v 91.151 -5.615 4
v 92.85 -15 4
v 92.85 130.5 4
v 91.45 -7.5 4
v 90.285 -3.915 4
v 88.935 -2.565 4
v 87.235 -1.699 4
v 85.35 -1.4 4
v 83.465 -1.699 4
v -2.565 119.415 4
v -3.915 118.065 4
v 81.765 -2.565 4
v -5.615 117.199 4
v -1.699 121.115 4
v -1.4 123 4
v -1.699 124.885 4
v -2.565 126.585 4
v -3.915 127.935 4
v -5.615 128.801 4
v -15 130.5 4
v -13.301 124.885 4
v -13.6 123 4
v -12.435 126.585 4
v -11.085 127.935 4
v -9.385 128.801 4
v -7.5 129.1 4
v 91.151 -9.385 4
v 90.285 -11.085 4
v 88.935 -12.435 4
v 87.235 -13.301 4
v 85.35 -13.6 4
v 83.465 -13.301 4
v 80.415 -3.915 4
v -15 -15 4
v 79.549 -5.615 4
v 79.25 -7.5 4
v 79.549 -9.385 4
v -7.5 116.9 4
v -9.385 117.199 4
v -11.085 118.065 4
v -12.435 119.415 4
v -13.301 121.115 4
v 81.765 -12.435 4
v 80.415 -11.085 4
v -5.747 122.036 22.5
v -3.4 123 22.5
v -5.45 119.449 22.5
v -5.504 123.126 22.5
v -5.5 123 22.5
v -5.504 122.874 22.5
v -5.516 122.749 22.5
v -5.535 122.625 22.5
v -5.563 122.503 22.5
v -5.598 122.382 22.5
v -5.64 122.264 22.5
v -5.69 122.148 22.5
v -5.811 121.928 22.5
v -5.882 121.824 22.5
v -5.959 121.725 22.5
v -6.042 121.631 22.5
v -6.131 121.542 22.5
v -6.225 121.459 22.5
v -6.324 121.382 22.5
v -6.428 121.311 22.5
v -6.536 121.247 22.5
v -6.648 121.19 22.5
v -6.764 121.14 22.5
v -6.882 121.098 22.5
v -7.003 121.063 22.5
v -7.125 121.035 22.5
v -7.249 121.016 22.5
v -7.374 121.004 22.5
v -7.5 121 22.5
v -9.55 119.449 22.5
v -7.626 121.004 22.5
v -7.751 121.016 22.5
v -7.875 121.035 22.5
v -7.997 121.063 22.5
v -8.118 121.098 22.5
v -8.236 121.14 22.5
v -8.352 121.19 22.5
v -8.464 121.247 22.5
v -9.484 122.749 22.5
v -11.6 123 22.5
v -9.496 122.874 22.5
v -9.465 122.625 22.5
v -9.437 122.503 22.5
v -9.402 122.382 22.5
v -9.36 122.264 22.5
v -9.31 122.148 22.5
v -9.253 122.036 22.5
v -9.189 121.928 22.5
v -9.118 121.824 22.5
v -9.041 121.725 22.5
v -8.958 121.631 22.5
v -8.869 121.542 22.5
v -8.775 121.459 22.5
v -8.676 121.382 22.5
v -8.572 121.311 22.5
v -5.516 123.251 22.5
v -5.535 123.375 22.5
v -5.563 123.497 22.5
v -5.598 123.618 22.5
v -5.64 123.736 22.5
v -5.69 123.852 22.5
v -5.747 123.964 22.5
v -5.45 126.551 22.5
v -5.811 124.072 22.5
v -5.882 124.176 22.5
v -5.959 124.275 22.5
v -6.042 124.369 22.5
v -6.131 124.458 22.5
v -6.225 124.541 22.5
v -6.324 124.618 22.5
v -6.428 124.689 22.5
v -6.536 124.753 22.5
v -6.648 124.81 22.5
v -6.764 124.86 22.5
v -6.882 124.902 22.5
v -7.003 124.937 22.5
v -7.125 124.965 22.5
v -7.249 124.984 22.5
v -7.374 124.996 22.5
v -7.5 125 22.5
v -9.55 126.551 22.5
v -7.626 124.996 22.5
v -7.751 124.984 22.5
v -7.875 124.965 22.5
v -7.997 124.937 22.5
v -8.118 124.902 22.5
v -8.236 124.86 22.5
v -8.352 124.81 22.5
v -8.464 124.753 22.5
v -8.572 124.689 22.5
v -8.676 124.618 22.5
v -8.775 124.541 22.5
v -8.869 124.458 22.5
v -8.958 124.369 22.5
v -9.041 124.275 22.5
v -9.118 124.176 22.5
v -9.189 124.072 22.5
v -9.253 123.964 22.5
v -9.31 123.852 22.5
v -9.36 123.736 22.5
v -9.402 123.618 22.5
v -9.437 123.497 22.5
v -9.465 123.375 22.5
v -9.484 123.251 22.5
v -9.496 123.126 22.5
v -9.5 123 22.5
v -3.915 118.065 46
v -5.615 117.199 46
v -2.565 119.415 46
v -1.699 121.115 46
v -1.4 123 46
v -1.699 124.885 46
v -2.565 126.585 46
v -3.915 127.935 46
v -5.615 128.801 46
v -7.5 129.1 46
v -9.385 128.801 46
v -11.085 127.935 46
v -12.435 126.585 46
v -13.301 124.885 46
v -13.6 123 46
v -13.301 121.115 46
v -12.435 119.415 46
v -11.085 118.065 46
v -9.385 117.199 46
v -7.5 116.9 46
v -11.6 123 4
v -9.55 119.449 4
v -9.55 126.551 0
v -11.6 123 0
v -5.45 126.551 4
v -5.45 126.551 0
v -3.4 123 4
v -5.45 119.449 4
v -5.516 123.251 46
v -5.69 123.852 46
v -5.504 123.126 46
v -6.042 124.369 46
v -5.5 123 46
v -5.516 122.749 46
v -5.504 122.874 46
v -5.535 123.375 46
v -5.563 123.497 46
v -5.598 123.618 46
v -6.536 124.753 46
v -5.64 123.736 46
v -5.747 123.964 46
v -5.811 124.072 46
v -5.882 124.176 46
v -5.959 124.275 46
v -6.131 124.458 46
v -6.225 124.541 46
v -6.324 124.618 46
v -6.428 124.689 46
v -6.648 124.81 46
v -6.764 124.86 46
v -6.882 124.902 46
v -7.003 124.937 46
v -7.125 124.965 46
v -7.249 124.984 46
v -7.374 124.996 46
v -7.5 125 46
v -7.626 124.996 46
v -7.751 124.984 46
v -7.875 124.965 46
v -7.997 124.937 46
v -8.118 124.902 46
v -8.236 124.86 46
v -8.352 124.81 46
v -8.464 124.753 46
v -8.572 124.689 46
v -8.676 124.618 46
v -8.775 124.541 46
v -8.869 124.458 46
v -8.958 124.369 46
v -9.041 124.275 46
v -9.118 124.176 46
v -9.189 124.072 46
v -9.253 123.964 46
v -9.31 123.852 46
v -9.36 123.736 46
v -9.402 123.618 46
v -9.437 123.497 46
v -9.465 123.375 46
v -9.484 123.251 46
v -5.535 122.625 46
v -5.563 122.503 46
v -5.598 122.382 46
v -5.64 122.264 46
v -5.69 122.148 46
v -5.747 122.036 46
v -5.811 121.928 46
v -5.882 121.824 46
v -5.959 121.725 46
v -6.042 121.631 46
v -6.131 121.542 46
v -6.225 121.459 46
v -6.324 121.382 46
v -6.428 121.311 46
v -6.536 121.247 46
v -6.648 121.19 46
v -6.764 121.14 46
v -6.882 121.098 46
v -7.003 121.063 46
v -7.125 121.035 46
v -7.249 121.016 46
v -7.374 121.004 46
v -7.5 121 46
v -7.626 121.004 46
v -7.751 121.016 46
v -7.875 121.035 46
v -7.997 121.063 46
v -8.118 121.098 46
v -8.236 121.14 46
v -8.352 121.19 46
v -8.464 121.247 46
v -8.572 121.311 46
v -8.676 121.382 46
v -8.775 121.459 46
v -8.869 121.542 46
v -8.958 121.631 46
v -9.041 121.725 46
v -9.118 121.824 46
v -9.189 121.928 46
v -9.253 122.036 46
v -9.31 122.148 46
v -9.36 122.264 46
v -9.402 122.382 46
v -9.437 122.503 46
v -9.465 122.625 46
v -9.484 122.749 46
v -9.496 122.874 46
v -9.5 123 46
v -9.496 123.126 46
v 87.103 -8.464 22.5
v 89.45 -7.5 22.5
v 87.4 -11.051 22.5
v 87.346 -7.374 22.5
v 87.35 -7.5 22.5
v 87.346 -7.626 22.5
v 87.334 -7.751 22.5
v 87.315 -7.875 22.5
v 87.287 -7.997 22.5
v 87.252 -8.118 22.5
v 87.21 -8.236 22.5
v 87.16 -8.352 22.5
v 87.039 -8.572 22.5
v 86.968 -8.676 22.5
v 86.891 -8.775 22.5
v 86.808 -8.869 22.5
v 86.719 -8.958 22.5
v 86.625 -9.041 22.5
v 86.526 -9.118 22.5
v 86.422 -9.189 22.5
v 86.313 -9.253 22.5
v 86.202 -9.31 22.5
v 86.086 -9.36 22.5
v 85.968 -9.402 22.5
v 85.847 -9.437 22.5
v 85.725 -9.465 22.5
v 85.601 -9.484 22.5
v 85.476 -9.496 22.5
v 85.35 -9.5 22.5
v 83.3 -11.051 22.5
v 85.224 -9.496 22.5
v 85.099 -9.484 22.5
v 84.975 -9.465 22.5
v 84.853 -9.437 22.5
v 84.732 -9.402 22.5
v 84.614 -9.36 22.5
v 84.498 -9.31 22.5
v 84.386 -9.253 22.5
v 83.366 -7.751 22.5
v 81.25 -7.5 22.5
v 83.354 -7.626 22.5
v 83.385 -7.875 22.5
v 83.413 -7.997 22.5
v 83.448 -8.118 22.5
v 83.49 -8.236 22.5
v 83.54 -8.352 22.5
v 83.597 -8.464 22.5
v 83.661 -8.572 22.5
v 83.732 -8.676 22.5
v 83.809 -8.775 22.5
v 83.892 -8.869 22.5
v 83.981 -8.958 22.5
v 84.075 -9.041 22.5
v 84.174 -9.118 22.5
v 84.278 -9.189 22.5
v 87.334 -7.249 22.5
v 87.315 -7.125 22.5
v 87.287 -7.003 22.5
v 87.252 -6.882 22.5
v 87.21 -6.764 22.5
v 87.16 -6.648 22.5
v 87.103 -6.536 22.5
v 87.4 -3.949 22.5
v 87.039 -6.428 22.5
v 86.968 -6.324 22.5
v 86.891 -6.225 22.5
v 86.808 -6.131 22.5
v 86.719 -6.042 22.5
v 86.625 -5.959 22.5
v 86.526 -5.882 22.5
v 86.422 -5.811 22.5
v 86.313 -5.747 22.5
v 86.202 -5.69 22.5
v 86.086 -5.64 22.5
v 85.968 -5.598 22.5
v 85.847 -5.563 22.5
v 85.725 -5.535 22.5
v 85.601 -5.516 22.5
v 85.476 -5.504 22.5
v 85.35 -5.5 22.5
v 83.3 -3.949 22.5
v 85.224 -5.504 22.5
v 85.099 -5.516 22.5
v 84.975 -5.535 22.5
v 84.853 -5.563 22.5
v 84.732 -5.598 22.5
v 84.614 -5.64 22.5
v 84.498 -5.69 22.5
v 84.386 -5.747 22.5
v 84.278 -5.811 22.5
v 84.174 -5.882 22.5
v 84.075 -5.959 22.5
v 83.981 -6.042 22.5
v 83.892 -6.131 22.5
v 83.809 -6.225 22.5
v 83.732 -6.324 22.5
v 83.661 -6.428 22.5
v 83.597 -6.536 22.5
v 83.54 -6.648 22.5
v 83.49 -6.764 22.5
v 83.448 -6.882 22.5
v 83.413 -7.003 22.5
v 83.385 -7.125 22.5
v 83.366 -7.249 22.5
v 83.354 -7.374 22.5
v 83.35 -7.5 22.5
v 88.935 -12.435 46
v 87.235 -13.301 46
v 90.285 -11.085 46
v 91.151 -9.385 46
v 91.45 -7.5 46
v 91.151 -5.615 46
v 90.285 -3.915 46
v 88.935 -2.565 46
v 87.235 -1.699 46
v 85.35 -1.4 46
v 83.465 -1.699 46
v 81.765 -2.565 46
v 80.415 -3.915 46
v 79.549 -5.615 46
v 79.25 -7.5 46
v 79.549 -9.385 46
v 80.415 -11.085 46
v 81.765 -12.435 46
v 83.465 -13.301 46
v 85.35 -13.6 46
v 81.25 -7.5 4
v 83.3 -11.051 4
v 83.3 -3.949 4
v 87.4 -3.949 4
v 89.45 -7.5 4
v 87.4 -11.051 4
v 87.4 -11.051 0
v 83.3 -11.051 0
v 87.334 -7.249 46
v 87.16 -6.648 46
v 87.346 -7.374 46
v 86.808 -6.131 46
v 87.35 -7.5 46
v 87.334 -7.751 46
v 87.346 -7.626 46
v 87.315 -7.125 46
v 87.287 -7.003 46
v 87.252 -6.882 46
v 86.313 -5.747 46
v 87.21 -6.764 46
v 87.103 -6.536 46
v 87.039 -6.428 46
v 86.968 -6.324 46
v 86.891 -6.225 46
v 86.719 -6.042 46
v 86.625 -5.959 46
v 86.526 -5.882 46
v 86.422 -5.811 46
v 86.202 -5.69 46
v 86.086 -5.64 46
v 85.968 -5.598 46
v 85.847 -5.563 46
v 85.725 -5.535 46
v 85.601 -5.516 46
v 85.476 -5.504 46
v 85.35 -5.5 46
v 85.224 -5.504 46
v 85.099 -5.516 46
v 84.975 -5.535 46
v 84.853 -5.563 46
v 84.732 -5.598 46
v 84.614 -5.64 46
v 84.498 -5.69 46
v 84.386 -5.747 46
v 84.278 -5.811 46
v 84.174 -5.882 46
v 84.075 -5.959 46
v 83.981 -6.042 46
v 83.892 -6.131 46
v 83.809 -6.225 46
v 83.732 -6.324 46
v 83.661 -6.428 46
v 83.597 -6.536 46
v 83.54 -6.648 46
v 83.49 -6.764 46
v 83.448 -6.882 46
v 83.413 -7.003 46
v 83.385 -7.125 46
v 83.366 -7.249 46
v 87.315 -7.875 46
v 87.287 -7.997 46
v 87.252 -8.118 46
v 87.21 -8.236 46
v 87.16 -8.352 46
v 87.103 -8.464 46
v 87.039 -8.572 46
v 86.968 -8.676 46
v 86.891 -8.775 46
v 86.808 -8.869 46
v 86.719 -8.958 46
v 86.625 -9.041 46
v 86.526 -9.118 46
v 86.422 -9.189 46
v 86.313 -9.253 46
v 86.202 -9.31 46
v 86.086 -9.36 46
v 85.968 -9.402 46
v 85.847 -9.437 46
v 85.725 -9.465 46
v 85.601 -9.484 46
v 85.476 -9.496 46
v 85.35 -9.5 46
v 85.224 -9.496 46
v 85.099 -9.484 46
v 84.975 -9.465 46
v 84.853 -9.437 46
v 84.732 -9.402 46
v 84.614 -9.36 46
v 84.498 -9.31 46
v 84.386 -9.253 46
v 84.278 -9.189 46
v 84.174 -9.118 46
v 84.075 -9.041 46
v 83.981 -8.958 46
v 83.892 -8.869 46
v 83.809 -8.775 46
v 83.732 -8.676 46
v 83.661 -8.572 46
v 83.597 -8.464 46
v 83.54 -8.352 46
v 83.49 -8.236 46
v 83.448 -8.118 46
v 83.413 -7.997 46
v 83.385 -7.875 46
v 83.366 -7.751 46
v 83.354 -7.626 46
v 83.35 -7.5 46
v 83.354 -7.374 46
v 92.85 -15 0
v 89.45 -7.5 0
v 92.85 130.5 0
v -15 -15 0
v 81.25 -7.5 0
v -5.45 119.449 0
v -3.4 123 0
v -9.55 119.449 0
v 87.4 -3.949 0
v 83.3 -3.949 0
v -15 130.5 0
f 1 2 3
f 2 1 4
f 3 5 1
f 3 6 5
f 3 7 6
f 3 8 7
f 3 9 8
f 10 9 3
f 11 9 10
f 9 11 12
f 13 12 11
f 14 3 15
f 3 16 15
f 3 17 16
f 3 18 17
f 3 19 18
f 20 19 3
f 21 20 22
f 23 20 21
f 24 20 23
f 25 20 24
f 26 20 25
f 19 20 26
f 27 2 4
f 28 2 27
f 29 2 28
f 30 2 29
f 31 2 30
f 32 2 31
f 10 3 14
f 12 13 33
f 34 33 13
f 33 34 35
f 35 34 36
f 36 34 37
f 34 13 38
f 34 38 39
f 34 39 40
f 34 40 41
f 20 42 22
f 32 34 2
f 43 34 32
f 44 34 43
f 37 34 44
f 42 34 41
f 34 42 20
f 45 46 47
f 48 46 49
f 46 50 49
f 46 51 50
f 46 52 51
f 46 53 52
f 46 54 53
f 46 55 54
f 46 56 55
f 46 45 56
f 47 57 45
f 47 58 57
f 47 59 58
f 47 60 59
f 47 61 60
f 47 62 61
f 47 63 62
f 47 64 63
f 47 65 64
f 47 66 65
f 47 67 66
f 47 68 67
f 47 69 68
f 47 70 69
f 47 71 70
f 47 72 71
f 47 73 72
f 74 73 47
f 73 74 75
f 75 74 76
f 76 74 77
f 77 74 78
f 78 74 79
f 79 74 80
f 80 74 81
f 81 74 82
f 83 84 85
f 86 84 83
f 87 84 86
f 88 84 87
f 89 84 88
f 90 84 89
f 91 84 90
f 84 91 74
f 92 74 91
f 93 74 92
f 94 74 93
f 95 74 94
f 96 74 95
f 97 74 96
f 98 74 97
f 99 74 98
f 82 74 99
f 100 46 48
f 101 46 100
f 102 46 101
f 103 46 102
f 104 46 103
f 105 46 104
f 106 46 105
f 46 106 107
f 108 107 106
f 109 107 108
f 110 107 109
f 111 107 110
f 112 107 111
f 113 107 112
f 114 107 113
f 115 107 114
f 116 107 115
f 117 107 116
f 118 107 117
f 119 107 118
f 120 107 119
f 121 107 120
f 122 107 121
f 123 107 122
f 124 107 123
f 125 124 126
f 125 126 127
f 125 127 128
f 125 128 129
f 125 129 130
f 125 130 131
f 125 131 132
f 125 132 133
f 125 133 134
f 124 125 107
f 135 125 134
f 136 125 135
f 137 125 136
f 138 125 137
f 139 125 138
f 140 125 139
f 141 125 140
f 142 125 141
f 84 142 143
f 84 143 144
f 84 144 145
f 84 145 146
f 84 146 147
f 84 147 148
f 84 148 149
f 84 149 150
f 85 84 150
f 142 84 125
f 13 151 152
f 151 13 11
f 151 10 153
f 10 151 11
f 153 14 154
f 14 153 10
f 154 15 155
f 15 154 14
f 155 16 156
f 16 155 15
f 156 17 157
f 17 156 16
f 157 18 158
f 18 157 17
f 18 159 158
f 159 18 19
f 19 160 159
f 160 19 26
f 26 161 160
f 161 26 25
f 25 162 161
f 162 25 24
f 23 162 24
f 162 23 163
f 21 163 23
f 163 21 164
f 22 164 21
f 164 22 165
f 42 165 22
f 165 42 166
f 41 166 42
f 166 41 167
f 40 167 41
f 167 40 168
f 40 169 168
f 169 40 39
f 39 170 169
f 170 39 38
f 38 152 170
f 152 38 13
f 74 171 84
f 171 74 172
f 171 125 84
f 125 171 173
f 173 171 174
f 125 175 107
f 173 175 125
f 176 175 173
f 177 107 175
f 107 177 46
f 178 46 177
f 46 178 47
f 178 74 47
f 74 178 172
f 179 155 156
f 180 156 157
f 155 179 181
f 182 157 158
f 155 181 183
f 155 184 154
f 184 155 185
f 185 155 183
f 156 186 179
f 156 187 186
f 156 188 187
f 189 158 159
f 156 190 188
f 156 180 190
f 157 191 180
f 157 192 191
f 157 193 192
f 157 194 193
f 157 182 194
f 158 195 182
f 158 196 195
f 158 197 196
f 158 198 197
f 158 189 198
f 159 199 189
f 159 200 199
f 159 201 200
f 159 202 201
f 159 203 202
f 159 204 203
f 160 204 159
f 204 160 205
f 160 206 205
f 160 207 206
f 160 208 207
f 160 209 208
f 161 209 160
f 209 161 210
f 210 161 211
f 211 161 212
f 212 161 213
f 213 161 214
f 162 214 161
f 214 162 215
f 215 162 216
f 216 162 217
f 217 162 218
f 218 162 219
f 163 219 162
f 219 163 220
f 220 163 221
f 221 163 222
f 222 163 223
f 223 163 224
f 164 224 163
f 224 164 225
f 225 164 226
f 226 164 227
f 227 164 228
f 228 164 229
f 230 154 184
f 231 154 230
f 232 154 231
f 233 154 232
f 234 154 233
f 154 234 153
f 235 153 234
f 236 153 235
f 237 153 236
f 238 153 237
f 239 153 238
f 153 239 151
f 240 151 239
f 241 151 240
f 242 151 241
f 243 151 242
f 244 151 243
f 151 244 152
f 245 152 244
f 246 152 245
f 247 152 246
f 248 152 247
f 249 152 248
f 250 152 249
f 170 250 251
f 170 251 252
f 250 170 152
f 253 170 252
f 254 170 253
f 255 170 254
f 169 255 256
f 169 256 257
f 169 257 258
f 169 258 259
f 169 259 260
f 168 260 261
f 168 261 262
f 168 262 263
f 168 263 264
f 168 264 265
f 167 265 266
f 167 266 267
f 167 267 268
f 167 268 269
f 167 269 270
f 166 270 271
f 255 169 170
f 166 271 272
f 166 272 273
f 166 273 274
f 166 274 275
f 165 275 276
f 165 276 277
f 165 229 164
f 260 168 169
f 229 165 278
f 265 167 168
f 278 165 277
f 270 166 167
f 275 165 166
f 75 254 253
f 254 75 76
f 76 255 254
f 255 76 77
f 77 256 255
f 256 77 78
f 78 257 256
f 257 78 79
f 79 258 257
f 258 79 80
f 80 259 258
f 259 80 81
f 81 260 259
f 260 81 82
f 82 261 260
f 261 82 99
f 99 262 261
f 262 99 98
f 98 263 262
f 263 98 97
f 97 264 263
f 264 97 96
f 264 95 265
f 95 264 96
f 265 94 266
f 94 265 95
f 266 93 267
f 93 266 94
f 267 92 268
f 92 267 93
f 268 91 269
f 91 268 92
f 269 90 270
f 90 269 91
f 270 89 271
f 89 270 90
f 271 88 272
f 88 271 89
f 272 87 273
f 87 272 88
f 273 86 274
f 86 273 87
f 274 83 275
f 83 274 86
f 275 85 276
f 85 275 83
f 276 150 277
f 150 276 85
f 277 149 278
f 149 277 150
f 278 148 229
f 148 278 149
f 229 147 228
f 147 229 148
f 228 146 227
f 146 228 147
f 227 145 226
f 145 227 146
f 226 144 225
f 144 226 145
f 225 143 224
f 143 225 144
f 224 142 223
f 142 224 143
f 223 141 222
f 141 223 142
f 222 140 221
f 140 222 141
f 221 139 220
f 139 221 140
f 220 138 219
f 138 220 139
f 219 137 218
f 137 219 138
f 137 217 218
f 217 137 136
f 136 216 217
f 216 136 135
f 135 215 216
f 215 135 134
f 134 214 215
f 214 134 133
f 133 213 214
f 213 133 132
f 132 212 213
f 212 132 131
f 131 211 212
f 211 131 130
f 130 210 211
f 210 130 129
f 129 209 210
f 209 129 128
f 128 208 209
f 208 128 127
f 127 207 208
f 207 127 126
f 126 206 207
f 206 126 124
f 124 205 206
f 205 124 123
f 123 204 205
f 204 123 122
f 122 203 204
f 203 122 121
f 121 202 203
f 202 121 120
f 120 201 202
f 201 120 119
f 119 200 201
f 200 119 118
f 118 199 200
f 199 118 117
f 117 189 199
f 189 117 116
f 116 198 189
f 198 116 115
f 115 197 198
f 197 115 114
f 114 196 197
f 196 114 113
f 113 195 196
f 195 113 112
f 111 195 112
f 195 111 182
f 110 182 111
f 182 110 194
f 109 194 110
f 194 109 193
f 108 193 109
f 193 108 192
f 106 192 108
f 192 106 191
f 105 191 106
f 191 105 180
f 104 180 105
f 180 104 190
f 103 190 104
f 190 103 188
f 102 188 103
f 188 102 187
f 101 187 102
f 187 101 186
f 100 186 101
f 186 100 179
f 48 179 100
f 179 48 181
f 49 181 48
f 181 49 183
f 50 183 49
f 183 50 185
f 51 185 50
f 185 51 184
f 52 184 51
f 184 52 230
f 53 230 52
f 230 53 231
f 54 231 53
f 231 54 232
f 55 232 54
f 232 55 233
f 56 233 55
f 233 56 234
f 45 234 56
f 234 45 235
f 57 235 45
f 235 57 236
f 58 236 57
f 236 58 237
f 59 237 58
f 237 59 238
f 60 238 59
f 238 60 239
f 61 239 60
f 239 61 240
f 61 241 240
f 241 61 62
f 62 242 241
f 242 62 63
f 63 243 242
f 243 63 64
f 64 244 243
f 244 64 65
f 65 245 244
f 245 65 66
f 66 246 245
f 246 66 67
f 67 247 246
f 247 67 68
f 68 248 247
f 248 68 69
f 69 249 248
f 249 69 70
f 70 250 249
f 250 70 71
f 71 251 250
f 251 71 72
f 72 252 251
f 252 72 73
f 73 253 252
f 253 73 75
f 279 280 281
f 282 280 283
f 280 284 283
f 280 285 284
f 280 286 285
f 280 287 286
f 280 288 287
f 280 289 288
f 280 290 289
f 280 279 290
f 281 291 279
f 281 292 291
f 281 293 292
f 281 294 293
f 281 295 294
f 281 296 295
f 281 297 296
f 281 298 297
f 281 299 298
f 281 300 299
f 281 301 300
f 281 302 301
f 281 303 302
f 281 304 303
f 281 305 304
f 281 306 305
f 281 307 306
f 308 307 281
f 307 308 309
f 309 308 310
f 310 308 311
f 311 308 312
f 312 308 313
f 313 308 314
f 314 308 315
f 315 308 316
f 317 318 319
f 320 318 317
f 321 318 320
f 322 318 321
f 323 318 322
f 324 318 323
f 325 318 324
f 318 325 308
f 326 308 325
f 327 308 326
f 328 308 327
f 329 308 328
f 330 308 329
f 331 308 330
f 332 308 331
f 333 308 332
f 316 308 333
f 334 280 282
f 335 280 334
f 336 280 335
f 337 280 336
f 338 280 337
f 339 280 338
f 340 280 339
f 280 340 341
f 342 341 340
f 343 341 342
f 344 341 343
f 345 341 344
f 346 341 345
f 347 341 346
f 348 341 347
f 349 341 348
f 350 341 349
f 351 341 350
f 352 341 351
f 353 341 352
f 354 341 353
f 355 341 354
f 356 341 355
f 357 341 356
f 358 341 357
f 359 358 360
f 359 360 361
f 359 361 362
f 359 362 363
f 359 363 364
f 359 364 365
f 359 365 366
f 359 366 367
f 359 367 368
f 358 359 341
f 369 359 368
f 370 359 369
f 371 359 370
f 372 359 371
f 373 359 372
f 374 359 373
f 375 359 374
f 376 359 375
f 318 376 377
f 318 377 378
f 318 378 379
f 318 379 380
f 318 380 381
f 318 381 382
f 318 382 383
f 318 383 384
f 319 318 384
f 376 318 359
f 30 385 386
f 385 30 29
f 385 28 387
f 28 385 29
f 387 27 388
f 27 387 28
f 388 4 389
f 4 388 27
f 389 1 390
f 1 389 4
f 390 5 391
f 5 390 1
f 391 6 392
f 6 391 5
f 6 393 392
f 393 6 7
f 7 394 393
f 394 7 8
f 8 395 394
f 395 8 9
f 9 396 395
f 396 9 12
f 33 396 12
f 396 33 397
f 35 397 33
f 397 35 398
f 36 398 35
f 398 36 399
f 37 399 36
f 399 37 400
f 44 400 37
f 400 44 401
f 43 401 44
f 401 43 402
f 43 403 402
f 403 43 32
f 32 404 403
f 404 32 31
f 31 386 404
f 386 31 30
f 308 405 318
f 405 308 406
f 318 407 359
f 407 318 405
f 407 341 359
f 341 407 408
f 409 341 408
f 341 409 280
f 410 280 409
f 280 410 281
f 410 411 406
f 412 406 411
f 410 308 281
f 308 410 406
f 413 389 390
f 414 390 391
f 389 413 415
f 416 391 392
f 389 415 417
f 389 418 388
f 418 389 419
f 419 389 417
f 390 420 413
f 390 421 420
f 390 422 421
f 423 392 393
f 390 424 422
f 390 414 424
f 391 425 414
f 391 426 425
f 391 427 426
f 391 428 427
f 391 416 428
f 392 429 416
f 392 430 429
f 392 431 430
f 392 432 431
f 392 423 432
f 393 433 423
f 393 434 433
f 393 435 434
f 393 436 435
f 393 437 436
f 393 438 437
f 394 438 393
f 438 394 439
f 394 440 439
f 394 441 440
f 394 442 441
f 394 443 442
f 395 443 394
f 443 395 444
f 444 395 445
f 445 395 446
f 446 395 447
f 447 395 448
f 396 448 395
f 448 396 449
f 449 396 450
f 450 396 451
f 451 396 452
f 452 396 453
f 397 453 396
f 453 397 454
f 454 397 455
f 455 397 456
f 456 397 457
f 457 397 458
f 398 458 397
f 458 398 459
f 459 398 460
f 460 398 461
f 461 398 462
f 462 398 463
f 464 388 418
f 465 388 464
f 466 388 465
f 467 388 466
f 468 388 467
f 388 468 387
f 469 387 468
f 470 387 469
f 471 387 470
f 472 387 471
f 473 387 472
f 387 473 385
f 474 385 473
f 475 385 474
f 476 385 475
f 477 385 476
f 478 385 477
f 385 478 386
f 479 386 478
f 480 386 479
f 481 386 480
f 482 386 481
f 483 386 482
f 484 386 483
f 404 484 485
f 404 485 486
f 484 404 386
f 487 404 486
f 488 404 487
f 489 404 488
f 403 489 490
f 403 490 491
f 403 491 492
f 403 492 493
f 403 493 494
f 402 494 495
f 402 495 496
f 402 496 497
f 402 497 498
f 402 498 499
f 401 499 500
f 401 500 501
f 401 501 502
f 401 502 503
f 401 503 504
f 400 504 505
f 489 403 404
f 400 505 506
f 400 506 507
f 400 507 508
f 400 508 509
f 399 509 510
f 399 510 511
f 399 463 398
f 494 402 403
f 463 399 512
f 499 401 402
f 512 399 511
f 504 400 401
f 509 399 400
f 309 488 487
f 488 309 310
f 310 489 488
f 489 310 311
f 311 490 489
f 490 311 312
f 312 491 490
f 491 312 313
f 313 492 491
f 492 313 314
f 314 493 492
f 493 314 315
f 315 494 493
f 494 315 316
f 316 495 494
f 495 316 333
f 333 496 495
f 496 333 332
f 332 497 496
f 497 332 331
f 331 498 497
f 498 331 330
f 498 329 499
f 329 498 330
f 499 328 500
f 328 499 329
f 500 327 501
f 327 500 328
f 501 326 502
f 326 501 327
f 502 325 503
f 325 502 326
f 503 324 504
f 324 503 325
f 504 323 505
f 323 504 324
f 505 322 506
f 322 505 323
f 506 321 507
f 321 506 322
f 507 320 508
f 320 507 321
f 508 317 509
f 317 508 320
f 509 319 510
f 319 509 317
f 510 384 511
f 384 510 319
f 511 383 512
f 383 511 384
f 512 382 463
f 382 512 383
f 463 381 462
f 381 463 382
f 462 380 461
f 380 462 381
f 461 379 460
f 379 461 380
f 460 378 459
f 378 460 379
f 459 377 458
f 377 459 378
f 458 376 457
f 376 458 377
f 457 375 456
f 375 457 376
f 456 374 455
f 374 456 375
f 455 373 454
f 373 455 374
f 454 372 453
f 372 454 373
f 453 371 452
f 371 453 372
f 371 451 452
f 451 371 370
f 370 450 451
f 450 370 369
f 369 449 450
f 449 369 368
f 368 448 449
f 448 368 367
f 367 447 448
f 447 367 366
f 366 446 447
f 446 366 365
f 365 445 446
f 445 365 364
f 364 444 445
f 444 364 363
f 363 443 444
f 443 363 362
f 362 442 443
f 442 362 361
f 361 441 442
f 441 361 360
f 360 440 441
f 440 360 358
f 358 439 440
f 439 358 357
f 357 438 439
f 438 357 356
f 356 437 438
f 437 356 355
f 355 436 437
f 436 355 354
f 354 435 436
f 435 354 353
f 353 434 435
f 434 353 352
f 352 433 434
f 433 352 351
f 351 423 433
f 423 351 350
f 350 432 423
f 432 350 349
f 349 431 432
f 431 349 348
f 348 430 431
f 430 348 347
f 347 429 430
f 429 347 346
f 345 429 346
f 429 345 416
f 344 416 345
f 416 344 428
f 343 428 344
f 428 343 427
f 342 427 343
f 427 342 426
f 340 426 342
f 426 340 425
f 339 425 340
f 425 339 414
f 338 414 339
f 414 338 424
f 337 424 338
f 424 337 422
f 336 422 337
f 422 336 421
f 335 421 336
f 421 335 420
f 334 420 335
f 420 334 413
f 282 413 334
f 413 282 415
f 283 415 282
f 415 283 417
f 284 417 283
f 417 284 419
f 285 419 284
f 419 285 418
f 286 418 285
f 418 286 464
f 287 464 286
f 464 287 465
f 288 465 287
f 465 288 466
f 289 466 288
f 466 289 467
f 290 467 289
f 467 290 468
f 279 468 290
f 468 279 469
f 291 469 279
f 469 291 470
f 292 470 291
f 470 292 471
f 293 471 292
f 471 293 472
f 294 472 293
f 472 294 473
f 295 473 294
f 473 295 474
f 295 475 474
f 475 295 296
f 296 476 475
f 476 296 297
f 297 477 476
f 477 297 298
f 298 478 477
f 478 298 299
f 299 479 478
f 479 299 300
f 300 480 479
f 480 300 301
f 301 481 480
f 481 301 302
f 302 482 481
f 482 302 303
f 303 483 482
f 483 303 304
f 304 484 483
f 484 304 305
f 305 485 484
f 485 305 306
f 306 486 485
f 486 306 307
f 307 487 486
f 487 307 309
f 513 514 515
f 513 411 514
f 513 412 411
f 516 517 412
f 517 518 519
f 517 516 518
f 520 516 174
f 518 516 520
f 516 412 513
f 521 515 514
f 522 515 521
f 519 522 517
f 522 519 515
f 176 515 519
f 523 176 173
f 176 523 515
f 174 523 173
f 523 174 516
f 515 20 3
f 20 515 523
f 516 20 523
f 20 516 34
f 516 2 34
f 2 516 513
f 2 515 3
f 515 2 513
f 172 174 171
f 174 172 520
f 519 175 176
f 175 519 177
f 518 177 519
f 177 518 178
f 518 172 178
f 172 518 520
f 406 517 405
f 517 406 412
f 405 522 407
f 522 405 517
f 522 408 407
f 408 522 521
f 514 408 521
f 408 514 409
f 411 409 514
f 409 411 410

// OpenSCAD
PSU_WIDTH = 77.85;
PSU_DEPTH = 115.5;
PSU_HEIGHT = 37;
LAYER_HEIGHT = 4;
OFFSET = 15;

module main(){
  base();
  translate([-OFFSET/2, PSU_DEPTH + OFFSET/2, LAYER_HEIGHT])
    high_low_connector();

  translate([PSU_WIDTH + OFFSET/2, -OFFSET/2, LAYER_HEIGHT])
    high_low_connector();  
}

module base(){
  // First layer
  linear_extrude(LAYER_HEIGHT)  
  difference(){
    translate([-OFFSET, -OFFSET])
    square([PSU_WIDTH + OFFSET*2, PSU_DEPTH + OFFSET*2]);

    translate([-OFFSET/2, PSU_DEPTH + OFFSET/2, 0])    
    m4_6_nut_2d();        

    translate([PSU_WIDTH + OFFSET/2, -OFFSET/2, 0])
    m4_6_nut_2d();              
  }  
}

module high_low_connector(){
  // First layer  
  linear_extrude(PSU_HEIGHT/2){
      difference(){
	circle(r=4.1+2);
	m4_6_nut_2d();
      }
    }

    // Second layer
  translate([0,0, PSU_HEIGHT/2]) {
    linear_extrude(PSU_HEIGHT/2 + 5){
      difference(){
	circle(r=4.1+2);
	m4_6_screw_2d();
      }      
    }
  }
}

module m4_6_screw_2d(){
  $fn = 100;
  circle(2);
}


module m4_6_screw_3d(length){
  linear_extrude(length)
    m4_6_screw_2d();
}

module m4_6_nut_2d(){
  $fn = 6;
  circle(4.1);
}
module m4_6_nut_3d(length){
  linear_extrude(length)
  m4_6_nut_2d();
}


main();
